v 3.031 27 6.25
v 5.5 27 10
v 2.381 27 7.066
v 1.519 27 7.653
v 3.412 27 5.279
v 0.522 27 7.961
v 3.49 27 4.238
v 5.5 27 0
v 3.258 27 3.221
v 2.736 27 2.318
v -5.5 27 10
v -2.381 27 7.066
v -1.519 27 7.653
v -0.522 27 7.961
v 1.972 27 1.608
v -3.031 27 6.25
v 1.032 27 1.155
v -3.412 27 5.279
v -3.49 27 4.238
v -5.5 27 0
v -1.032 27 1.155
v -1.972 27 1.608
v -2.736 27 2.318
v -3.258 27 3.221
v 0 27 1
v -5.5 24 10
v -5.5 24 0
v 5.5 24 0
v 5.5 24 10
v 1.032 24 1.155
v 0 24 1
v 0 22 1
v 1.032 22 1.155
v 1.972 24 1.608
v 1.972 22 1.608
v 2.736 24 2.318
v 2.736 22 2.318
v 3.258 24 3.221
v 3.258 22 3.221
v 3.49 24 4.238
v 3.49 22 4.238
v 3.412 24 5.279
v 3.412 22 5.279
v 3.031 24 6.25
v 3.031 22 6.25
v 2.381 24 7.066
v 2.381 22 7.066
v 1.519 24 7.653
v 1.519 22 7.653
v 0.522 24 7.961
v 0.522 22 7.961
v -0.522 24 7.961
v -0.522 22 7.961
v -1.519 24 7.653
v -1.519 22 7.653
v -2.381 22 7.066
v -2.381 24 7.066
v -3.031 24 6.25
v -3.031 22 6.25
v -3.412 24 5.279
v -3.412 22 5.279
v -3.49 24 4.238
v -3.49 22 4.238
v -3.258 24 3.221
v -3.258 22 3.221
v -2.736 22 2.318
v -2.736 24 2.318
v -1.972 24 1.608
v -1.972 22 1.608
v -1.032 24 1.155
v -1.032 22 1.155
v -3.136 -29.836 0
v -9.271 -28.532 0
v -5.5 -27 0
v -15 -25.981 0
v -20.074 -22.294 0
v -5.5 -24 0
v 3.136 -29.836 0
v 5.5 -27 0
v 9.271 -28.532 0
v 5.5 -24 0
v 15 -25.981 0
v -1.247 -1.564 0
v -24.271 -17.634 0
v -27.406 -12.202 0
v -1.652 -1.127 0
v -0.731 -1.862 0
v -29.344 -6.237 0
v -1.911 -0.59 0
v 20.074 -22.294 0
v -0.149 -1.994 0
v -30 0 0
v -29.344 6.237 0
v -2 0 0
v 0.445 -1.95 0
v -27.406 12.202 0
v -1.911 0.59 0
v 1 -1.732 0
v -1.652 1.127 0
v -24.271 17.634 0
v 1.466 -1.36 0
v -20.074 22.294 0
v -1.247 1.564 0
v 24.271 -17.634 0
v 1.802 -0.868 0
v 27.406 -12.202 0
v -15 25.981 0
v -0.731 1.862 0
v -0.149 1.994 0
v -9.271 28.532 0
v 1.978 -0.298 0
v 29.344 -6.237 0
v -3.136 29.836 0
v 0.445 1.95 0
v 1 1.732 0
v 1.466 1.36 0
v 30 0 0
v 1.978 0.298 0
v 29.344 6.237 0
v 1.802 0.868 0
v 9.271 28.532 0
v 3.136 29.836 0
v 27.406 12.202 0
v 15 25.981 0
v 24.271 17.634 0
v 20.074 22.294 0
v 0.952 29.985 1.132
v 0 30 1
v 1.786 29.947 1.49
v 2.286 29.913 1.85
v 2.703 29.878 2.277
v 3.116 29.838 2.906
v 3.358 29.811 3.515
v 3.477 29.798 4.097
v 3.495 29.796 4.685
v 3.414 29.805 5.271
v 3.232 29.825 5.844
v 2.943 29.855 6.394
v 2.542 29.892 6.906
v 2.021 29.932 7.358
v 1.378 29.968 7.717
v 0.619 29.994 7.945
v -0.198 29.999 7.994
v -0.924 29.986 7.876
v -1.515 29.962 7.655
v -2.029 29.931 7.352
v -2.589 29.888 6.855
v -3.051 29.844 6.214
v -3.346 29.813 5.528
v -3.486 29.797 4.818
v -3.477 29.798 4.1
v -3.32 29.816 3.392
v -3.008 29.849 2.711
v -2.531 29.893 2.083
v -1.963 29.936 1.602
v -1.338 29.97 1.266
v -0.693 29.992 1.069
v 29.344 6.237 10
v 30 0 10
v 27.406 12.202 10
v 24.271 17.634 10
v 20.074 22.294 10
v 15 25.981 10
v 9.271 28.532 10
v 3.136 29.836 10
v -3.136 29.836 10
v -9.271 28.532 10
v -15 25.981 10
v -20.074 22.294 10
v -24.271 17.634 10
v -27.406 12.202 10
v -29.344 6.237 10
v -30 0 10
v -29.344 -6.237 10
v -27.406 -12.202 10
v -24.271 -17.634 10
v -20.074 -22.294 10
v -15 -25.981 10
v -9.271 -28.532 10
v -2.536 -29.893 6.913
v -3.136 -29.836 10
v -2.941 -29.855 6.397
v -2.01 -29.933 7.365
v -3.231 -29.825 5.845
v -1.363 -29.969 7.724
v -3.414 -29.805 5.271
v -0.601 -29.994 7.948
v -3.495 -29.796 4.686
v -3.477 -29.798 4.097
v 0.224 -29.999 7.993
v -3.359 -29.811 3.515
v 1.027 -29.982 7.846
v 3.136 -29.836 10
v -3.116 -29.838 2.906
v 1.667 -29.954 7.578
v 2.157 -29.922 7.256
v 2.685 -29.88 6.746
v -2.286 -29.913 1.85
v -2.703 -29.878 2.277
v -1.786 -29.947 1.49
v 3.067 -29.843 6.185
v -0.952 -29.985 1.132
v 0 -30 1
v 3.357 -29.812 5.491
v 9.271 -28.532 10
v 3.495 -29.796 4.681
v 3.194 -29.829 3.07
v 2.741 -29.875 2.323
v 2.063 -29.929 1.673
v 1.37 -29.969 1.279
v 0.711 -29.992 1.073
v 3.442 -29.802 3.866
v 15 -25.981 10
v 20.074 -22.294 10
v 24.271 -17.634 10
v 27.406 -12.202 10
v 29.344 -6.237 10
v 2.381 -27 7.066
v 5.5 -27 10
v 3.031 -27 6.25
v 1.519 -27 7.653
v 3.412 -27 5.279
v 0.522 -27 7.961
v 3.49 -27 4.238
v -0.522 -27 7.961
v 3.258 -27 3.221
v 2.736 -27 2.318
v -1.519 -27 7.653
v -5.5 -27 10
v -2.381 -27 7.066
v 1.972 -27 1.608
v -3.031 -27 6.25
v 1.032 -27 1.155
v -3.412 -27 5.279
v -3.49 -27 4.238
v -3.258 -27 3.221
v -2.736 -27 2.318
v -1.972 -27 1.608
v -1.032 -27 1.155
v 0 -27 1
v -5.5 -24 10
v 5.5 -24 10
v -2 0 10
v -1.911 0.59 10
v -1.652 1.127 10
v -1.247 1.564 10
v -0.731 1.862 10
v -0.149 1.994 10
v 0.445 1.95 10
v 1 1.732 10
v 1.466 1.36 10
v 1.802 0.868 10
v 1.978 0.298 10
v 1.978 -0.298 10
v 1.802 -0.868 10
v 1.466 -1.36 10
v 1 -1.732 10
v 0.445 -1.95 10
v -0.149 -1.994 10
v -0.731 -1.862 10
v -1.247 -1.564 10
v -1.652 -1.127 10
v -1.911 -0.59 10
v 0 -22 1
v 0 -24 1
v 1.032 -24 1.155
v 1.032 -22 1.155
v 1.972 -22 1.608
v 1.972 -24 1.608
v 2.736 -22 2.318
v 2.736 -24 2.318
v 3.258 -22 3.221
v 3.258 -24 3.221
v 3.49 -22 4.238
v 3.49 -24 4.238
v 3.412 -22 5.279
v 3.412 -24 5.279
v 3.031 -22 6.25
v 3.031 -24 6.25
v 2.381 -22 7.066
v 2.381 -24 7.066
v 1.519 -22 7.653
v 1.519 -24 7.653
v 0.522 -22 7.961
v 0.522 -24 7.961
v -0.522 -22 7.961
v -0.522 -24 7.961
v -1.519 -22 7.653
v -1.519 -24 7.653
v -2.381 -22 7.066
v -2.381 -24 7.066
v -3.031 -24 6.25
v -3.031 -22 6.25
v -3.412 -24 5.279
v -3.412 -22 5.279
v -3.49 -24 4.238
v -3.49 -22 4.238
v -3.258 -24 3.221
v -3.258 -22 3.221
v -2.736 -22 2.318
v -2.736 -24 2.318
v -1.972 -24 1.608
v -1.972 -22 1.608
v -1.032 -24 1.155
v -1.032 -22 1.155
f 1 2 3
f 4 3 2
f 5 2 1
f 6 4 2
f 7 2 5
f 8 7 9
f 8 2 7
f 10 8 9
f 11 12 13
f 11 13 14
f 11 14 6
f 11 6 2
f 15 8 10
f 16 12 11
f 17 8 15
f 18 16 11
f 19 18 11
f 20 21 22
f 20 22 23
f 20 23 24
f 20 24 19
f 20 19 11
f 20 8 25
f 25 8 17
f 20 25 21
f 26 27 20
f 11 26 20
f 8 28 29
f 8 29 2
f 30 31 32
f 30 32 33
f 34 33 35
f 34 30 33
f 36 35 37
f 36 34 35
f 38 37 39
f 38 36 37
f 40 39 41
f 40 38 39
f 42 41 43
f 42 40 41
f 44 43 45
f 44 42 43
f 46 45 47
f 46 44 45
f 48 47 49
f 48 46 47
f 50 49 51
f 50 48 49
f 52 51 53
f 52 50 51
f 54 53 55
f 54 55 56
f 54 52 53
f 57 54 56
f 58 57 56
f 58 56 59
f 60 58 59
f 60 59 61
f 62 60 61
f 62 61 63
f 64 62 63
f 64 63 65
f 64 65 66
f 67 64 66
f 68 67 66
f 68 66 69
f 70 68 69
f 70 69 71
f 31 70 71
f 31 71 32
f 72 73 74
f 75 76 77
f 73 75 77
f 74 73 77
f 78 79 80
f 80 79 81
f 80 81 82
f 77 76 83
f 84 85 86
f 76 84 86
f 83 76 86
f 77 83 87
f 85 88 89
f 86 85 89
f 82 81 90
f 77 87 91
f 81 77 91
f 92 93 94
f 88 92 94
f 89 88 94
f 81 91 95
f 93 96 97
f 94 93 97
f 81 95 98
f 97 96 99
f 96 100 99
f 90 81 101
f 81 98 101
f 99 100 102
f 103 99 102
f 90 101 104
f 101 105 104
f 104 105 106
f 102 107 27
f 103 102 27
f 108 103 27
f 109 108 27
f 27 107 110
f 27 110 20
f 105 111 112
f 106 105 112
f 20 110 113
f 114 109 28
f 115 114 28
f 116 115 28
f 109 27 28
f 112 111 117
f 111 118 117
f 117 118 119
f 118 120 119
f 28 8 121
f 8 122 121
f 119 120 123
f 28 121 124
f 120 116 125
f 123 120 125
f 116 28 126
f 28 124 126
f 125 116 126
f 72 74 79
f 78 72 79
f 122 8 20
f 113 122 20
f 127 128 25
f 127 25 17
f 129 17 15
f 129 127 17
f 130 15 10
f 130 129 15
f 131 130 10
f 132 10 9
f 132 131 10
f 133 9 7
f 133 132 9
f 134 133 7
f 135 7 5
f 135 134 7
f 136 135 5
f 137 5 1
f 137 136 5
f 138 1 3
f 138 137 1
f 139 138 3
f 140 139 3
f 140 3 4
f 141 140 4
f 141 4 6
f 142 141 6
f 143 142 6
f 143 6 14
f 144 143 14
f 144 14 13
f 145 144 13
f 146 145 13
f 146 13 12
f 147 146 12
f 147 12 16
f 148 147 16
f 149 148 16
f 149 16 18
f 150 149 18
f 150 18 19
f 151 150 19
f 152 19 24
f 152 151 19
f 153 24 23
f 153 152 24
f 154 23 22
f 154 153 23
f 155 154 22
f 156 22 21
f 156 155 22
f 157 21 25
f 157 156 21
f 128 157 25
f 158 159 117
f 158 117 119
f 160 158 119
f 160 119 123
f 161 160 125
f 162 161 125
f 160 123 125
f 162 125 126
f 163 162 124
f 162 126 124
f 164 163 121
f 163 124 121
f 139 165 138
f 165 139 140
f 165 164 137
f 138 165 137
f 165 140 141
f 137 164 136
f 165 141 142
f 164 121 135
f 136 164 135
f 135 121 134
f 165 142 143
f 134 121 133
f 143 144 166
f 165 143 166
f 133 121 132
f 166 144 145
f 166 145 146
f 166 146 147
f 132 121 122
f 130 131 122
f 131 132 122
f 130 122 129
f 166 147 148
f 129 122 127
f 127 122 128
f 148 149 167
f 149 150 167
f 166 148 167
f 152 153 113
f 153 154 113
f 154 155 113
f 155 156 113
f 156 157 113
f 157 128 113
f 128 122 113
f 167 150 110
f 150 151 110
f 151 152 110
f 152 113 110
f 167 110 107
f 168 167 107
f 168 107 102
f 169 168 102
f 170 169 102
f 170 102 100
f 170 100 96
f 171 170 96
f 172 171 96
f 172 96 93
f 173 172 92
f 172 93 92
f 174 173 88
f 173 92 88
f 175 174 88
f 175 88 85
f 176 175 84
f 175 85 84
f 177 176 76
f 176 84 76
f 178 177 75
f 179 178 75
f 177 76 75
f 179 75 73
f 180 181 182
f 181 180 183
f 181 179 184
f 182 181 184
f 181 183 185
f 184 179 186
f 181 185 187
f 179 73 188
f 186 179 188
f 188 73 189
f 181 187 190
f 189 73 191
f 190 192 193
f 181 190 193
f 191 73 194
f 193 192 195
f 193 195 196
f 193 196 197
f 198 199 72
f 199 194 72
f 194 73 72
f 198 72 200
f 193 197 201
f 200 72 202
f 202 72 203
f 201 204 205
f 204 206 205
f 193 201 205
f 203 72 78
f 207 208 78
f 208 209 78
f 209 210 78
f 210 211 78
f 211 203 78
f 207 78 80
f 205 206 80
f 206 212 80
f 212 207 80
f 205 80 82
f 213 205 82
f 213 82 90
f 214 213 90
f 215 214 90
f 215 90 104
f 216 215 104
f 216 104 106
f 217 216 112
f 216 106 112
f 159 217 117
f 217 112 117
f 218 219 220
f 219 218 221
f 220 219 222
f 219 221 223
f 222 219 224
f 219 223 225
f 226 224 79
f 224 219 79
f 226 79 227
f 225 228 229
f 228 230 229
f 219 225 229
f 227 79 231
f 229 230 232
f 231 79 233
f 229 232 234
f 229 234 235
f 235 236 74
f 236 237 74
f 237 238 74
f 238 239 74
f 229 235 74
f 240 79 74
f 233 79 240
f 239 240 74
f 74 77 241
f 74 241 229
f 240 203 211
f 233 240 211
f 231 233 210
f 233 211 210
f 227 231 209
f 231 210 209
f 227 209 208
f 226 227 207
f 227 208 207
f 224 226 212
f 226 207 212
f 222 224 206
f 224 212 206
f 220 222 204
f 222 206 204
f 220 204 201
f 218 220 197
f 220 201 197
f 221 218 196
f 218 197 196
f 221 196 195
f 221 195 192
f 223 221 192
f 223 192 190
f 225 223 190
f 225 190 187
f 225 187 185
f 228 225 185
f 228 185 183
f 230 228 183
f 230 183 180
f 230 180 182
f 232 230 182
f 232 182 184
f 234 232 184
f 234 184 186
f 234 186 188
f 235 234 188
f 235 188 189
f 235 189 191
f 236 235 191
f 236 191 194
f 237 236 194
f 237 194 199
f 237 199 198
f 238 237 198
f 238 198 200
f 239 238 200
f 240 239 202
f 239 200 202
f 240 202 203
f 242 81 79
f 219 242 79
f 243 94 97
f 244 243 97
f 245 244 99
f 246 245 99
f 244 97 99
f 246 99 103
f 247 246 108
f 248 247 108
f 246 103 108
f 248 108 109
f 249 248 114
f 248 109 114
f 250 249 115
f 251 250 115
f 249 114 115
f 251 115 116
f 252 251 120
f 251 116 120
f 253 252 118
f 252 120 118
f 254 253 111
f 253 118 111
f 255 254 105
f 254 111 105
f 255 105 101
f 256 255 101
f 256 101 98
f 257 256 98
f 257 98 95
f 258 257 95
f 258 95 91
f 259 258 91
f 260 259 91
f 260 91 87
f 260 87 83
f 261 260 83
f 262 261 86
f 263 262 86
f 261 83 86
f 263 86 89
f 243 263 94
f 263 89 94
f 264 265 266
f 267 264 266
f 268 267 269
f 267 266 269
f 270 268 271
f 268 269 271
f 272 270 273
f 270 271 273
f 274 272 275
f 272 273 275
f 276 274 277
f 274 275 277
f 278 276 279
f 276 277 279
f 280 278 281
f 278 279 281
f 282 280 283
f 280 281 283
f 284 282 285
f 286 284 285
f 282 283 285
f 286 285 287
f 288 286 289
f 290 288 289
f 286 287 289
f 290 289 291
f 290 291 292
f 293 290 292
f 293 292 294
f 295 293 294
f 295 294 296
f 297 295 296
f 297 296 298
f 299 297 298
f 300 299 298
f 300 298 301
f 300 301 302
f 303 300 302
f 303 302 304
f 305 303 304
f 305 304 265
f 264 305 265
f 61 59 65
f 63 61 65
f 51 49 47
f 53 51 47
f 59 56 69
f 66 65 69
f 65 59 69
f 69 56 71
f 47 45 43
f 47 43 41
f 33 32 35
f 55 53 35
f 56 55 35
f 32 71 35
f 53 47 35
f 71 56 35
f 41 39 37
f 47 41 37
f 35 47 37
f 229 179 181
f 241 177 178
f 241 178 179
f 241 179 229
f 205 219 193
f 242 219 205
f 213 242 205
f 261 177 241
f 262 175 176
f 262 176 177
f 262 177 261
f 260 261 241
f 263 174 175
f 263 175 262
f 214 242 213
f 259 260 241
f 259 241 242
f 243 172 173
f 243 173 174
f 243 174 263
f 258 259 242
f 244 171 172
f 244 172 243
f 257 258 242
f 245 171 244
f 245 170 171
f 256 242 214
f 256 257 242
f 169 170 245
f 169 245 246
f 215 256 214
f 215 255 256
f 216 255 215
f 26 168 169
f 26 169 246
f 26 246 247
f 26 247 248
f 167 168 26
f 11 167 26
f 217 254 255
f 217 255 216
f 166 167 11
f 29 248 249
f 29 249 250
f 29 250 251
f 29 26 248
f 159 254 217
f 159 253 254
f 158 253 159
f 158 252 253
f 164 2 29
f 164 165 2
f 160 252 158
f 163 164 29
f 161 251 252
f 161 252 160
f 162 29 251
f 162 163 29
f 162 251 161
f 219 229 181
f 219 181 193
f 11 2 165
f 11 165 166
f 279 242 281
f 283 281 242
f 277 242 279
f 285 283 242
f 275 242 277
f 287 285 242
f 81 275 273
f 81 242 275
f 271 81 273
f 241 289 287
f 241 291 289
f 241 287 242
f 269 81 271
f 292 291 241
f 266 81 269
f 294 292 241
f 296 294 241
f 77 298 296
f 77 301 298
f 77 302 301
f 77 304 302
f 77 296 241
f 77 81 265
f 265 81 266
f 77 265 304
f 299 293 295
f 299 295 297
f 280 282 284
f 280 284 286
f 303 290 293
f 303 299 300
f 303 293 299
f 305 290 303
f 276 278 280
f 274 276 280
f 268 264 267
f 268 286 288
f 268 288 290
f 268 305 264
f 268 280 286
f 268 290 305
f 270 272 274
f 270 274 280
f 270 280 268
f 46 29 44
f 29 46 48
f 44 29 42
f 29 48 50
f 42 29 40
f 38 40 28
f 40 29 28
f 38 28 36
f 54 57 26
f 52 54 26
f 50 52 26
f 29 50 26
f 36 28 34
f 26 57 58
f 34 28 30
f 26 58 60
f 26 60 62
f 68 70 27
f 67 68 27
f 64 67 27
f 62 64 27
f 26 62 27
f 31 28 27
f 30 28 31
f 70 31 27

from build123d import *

# Parameters (mm, degrees)
SKETCH1_R           = 30
BOSS_EXTRUDE1_DEPTH = 10
SKETCH10_R          = 3.5
CUT_EXTRUDE6_DEPTH  = 8
SKETCH23_W          = 11
SKETCH23_H          = 3
CUT_EXTRUDE8_DEPTH  = 10
SKETCH24_R          = 2
CUT_EXTRUDE9_DEPTH  = 10


with BuildPart() as part:
    # Sketch1 → Boss-Extrude1 (new body)
    with BuildSketch(Plane.XY):
        Circle(SKETCH1_R)
    extrude(amount=BOSS_EXTRUDE1_DEPTH)

    # Sketch10 → Cut-Extrude6 (cut)
    with BuildSketch(Plane(origin=(0, -30, 0), x_dir=(-1, 0, 0), z_dir=(0, -1, 0))):
        with Locations(Location((0, -4.5, 0), (0, 0, 90))):
            Circle(SKETCH10_R)
    cut_extrude6 = extrude(amount=-CUT_EXTRUDE6_DEPTH, mode=Mode.SUBTRACT)

    # Mirror2: Cut-Extrude6 across plane
    add(cut_extrude6.mirror(Plane.ZX), mode=Mode.SUBTRACT)

    # Sketch23 → Cut-Extrude8 (cut)
    with BuildSketch(Plane(origin=(0, 0, 0), x_dir=(-1, 0, 0), z_dir=(0, 0, -1))):
        with Locations((0, 25.5)):
            Rectangle(SKETCH23_W, SKETCH23_H)
    cut_extrude8 = extrude(amount=-CUT_EXTRUDE8_DEPTH, mode=Mode.SUBTRACT)

    # Mirror3: Cut-Extrude8 across plane
    add(cut_extrude8.mirror(Plane.ZX), mode=Mode.SUBTRACT)

    # Sketch24 → Cut-Extrude9 (cut)
    with BuildSketch(Plane(origin=(0, 0, 0), x_dir=(-1, 0, 0), z_dir=(0, 0, -1))):
        Circle(SKETCH24_R)
    extrude(amount=-CUT_EXTRUDE9_DEPTH, mode=Mode.SUBTRACT)


solid = part.part
